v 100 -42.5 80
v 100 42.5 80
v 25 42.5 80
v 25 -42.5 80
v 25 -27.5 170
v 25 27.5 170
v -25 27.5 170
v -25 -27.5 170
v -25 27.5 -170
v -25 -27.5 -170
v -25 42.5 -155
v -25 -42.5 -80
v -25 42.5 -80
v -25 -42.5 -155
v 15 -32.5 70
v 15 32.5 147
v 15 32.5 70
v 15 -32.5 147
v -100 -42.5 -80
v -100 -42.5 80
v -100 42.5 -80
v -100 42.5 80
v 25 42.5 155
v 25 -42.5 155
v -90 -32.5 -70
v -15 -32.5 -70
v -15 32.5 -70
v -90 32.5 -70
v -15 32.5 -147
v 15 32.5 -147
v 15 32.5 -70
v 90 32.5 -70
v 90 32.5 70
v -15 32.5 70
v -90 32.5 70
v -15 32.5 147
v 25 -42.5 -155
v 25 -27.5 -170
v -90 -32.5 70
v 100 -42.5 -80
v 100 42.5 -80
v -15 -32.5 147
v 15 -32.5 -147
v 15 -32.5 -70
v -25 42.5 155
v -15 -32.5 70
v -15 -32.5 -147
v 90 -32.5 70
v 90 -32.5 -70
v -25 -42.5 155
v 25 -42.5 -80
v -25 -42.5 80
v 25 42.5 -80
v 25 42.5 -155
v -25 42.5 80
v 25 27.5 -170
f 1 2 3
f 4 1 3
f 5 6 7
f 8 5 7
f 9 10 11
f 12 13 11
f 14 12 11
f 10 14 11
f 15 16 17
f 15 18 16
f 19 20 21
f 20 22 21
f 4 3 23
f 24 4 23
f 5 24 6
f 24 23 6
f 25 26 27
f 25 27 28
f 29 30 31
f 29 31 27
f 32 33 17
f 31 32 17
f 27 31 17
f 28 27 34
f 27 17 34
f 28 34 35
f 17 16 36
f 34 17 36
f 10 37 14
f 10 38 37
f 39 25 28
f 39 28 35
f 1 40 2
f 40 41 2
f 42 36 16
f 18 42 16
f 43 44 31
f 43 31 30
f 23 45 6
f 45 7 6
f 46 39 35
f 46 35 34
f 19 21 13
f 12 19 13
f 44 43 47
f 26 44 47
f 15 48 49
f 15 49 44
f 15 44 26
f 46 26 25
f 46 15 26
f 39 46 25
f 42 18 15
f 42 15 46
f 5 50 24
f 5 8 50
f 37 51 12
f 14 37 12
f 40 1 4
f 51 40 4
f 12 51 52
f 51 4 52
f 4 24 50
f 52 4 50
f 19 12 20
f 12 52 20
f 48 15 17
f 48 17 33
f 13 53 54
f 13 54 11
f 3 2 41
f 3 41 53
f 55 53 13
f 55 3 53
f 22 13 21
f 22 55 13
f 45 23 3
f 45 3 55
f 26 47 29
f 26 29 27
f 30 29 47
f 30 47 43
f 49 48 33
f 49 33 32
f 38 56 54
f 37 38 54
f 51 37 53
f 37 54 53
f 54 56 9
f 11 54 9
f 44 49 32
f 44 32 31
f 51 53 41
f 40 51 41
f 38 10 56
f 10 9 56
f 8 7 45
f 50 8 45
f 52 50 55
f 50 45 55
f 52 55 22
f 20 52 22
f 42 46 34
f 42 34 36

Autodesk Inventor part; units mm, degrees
ref_plane "YZ Plane" through (0, 0, 0) normal (1, 0, 0) x (0, 1, 0)
ref_plane "XZ Plane" through (0, 0, 0) normal (0, 1, 0) x (-1, 0, 0)
ref_plane "XY Plane" through (0, 0, 0) normal (0, 0, 1) x (1, 0, 0)
sketch "Sketch1" plane through (0, 0, 0) normal (0, 1, 0) x (-1, 0, 0)
  line L0 (-100, -80) -> (-100, 80)
  line L1 (100, 80) -> (100, -80)
  line L2 (100, -80) -> (-100, 80) construction
  line L3 (-100, -80) -> (100, 80) construction
  line L4 (25, -170) -> (-25, -170)
  line L5 (-25, 170) -> (25, 170)
  line L6 (25, -170) -> (-25, 170) construction
  line L7 (-25, -170) -> (25, 170) construction
  line L8 (25, 170) -> (25, 80)
  line L9 (25, -80) -> (25, -170)
  line L10 (100, -80) -> (25, -80)
  line L11 (-25, -80) -> (-100, -80)
  line L12 (-25, -170) -> (-25, -80)
  line L13 (-25, 80) -> (-25, 170)
  line L14 (-100, 80) -> (-25, 80)
  line L15 (25, 80) -> (100, 80)
  line L16 (100, 0) -> (-100, 0) construction
  line L17 (0, -170) -> (0, 170) construction
  line L18 (15, -70) -> (90, -70)
  line L19 (90, -70) -> (90, 70)
  line L20 (90, 70) -> (15, 70)
  line L21 (15, 70) -> (15, 160)
  line L22 (15, 160) -> (-15, 160)
  line L23 (-15, 160) -> (-15, 70)
  line L24 (-15, 70) -> (-90, 70)
  line L25 (-90, 70) -> (-90, -70)
  line L26 (-90, -70) -> (-15, -70)
  line L27 (-15, -70) -> (-15, -160)
  line L28 (-15, -160) -> (15, -160)
  line L29 (15, -160) -> (15, -70)
  line L30 (15, -147) -> (-15, -147)
  line L31 (15, 147) -> (-15, 147)
  point P0 (0, 0)
  dimension "d0" = 50
  dimension "d1" = 200
  dimension "d2" = 340
  dimension "d3" = 160
  dimension "d9" = 10
  dimension "d10" = 23
  dimension "d11" = 23
extrude "Extrusion1" add sketch "Sketch1" along normal mid plane 85 contours L0 L14 L13 L5 L8 L15 L1 L10 L9 L4 L12 L11 | L29 L30 L27 L26 L25 L24 L23 L31 L21 L20 L19 L18 | L29 L28 L27 L30 | L31 L23 L22 L21
chamfer "Chamfer1" distance 15 angle 45 4 edges at (0, 42.5, 170) (0, -42.5, 170) (0, 42.5, -170) (0, -42.5, -170)
extrude "Extrusion2" cut sketch "Sketch1" along normal mid plane 65 contours L29 L30 L27 L26 L25 L24 L23 L31 L21 L20 L19 L18
